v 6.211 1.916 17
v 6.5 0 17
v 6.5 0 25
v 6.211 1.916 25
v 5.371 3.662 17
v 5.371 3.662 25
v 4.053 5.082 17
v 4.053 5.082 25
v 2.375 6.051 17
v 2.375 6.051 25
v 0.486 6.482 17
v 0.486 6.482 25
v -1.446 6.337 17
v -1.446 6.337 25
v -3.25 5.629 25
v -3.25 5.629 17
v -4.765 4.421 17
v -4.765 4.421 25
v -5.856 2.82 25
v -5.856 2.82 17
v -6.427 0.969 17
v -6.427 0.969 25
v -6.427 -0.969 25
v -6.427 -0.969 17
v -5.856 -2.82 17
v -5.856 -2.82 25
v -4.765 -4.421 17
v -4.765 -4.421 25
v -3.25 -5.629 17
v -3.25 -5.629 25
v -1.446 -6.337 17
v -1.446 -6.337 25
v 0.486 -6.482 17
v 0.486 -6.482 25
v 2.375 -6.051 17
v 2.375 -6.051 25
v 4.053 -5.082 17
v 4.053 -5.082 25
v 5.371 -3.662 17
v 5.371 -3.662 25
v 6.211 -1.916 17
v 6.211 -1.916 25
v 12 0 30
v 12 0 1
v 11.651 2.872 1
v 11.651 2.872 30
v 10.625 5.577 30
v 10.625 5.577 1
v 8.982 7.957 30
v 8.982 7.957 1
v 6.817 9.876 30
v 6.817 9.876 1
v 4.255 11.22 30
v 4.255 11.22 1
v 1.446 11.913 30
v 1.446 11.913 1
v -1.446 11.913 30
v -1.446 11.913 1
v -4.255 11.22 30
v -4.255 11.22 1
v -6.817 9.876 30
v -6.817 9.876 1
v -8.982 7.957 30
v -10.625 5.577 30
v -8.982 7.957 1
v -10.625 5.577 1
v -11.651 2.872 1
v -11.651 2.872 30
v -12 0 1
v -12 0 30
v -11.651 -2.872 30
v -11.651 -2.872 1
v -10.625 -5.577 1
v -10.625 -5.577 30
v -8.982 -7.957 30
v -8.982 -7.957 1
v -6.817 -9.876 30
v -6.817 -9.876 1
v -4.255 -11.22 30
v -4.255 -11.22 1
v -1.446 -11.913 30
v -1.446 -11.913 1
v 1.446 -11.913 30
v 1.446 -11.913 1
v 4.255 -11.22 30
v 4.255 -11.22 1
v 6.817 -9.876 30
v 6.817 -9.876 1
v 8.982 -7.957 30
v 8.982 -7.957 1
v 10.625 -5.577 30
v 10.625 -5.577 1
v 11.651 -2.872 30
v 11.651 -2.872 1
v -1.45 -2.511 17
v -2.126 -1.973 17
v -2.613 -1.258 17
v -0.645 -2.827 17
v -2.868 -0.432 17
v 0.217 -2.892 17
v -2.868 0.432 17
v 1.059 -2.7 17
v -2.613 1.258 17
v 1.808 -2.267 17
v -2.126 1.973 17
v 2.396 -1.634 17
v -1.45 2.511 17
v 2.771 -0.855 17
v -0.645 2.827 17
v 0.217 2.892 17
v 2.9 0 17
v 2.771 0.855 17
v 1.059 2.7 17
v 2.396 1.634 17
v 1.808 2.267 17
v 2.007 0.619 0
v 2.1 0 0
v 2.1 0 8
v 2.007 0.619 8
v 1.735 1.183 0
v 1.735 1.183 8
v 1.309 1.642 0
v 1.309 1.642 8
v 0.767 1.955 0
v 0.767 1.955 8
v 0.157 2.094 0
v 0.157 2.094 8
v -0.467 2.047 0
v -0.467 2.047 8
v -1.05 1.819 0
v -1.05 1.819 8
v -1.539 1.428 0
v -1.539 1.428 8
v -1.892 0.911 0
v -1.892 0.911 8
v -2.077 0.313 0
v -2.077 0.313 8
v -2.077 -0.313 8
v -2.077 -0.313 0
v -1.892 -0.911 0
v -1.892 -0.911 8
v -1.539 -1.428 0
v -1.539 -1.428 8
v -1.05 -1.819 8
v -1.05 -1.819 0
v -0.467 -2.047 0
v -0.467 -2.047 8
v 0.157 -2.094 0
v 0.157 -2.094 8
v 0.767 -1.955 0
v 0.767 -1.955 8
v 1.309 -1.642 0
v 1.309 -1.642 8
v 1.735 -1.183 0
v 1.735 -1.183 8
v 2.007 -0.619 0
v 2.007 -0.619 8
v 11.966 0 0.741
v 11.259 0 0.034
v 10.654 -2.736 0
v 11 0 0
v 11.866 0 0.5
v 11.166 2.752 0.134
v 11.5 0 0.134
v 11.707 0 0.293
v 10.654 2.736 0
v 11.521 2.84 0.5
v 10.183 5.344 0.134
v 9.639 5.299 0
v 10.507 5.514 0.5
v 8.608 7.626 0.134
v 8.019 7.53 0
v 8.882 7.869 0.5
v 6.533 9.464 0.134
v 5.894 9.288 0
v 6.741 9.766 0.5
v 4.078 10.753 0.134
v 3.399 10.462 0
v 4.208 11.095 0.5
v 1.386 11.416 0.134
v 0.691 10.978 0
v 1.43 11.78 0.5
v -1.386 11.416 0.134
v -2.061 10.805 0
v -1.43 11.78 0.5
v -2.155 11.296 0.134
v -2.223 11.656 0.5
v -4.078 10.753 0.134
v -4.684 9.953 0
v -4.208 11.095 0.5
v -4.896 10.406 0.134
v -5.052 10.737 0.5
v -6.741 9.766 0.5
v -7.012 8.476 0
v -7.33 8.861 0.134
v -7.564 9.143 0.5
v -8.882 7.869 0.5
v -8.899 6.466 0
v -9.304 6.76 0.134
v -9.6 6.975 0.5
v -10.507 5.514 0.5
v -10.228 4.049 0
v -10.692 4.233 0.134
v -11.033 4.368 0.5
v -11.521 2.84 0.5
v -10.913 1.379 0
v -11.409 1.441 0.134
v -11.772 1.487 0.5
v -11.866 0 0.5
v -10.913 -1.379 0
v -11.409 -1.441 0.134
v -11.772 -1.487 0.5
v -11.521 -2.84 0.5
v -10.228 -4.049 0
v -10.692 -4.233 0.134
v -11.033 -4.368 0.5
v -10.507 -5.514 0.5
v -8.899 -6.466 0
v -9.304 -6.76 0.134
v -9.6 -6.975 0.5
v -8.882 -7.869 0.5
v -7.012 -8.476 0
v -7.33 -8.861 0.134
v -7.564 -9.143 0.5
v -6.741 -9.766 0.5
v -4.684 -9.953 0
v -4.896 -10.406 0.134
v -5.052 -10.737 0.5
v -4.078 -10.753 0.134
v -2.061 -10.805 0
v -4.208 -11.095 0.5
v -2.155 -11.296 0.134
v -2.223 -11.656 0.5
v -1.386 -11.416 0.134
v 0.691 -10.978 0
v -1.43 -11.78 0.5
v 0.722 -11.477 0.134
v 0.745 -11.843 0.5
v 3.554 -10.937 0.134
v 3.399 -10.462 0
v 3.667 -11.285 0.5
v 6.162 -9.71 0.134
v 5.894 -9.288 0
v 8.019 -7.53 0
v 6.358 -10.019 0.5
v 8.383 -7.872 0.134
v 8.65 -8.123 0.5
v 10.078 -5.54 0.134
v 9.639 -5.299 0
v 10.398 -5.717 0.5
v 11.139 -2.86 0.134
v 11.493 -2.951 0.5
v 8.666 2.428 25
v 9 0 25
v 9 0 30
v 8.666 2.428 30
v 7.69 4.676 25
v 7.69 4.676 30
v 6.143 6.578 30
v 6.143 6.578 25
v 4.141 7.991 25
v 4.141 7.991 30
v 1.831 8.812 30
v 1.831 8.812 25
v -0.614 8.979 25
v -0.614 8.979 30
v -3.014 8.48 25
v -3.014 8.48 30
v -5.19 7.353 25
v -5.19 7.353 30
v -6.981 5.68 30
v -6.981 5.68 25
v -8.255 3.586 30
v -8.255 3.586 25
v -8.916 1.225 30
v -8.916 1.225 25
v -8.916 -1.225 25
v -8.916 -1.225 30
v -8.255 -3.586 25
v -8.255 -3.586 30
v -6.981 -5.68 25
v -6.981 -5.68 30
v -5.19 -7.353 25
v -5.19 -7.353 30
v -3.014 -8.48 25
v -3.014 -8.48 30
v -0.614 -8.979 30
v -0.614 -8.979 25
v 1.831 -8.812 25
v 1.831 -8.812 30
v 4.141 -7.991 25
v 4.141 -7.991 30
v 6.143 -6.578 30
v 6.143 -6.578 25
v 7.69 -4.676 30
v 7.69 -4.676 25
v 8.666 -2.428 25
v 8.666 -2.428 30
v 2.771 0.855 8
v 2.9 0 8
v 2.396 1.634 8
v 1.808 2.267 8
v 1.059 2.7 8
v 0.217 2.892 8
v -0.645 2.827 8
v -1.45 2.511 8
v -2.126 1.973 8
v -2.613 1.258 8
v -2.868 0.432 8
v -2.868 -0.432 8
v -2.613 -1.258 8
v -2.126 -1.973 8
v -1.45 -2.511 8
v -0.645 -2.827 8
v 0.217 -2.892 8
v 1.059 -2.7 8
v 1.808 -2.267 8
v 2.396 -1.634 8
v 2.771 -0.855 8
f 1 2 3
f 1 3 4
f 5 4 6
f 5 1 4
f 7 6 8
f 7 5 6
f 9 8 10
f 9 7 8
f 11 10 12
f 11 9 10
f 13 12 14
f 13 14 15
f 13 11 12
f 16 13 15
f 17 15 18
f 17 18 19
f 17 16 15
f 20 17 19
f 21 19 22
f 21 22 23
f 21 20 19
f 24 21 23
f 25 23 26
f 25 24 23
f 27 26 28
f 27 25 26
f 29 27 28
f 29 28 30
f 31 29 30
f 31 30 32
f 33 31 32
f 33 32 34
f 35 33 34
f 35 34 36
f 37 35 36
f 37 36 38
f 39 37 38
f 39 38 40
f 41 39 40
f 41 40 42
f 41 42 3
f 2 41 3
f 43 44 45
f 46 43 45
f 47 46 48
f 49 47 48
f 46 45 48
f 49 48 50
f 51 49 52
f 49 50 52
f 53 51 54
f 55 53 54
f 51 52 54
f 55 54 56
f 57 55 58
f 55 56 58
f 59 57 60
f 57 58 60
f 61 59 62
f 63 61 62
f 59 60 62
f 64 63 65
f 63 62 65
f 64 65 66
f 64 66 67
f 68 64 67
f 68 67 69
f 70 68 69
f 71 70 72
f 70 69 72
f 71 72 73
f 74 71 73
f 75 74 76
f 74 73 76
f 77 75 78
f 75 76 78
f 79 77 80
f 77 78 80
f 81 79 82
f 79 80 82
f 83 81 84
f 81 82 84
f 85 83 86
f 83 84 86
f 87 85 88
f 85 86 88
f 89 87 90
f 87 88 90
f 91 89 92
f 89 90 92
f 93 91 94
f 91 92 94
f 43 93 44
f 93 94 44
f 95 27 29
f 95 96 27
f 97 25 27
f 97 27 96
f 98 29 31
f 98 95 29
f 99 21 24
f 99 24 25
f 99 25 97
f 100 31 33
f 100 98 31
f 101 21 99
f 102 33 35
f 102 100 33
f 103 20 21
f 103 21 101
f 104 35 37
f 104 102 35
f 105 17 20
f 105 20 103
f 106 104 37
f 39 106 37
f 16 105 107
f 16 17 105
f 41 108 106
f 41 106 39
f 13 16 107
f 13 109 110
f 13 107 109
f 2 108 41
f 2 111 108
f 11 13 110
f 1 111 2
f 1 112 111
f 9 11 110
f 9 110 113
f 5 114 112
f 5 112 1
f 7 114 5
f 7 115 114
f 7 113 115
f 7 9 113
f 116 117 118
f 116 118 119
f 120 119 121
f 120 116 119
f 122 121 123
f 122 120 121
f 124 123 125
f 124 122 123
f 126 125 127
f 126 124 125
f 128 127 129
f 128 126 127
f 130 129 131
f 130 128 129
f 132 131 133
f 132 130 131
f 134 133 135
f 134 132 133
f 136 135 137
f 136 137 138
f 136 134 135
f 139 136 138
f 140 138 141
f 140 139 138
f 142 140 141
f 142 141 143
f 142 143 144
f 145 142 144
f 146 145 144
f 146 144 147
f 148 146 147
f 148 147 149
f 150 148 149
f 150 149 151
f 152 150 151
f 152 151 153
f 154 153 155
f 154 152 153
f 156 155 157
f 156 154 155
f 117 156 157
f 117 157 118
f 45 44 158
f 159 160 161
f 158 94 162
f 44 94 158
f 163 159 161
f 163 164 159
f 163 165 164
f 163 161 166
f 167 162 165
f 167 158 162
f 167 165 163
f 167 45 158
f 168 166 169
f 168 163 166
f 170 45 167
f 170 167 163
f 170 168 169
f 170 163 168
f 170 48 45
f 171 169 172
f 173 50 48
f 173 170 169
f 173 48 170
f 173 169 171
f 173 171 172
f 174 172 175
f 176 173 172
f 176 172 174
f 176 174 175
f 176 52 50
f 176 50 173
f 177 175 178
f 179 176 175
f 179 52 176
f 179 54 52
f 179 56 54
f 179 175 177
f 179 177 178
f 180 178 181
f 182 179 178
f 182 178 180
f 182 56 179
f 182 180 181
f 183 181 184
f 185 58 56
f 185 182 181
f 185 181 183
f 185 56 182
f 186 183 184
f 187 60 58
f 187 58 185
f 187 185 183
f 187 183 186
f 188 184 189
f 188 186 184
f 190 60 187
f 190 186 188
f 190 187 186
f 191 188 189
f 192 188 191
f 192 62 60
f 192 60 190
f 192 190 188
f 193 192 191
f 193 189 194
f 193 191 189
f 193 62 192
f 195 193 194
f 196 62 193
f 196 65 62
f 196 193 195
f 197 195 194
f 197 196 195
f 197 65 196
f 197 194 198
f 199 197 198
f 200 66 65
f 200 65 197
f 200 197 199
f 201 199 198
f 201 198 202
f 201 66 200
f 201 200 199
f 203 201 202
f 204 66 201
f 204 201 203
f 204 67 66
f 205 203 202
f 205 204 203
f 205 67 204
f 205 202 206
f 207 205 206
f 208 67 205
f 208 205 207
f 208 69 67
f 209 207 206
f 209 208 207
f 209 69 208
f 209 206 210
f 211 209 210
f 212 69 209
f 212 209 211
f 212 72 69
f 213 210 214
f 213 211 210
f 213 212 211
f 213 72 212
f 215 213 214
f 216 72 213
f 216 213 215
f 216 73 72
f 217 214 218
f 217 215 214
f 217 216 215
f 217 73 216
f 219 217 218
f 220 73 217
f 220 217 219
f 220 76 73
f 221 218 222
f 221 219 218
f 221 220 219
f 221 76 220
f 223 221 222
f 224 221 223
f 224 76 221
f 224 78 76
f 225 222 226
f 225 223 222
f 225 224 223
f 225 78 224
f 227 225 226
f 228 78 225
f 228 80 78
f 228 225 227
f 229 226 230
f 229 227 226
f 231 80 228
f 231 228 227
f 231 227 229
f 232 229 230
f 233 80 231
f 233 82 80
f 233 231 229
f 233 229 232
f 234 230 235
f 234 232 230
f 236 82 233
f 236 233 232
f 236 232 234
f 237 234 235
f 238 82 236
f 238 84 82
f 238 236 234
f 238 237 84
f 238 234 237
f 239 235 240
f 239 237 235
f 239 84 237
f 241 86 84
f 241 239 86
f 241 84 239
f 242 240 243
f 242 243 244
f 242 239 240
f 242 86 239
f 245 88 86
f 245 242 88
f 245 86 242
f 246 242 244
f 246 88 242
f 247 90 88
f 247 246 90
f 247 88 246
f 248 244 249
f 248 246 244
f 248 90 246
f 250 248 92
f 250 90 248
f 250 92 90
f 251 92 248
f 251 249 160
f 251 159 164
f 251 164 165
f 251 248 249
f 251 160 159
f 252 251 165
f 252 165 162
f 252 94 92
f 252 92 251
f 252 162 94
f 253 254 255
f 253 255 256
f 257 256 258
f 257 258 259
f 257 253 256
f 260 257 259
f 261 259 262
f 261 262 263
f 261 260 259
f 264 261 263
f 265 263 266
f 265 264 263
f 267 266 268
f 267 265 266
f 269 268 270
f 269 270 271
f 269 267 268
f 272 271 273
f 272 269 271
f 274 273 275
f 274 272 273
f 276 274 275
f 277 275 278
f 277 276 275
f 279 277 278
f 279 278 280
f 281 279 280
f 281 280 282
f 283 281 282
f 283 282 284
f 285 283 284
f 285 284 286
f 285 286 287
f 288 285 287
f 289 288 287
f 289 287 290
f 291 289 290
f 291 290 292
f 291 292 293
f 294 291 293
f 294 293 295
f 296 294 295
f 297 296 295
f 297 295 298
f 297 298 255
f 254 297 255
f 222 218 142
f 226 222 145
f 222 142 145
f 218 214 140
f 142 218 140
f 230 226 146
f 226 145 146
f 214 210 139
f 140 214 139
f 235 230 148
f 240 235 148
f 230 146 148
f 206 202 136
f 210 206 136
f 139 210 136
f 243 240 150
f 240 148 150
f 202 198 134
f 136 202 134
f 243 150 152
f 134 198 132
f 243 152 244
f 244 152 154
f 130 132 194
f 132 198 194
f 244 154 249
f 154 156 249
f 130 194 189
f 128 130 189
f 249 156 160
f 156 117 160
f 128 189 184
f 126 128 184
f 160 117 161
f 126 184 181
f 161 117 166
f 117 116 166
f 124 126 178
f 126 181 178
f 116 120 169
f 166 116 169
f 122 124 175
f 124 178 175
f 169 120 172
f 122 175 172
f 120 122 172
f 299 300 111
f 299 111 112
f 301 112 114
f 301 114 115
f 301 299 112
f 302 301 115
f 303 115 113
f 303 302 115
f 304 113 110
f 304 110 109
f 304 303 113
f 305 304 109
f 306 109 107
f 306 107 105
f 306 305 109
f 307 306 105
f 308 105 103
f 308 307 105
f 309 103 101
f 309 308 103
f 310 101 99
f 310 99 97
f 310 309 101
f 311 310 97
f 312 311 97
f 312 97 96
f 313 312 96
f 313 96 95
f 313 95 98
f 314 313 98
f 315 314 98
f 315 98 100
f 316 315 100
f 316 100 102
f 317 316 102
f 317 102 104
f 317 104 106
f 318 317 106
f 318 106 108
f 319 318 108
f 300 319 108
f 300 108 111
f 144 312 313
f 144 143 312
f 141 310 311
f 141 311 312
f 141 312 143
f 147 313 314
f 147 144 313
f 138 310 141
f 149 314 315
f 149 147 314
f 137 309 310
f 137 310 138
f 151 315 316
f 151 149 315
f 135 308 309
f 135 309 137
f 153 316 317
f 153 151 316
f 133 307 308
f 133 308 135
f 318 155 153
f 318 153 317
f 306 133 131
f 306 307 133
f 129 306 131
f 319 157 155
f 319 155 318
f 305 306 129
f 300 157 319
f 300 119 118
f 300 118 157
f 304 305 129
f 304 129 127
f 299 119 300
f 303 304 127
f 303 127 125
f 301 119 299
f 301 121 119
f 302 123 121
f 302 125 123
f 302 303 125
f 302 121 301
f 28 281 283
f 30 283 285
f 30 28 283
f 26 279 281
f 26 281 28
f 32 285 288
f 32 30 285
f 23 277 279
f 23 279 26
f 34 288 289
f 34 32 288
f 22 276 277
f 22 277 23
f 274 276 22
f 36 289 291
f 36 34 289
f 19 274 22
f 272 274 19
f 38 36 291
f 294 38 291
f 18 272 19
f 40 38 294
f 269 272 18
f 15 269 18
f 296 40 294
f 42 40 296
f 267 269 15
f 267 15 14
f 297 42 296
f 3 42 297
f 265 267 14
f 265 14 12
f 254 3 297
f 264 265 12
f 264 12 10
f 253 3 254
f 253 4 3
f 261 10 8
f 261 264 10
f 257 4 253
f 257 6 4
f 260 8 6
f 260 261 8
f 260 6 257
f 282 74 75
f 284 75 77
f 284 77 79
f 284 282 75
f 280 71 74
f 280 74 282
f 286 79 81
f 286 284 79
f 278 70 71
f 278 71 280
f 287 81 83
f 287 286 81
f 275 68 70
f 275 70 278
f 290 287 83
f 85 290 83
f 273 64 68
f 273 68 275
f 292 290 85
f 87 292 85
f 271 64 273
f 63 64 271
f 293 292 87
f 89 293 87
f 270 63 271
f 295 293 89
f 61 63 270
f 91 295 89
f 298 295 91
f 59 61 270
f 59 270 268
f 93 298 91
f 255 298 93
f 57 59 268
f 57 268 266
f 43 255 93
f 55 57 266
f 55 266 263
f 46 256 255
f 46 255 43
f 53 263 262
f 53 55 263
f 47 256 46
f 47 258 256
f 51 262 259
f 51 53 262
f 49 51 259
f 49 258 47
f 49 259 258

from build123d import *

# Parameters (mm, degrees)
F0_R     = 12
F0_R_2   = 9
F1_DEPTH = 30
F0_R_3   = 6.5
F2_DEPTH = 25
F0_R_4   = 2.9
F3_DEPTH = 17
F0_R_5   = 2.1
F4_DEPTH = 8
F5_R     = 1


with BuildPart() as f1:
    # F0 (on Top) → F1 (new body)
    with BuildSketch(Plane.XY):
        Circle(F0_R)
        Circle(F0_R_2, mode=Mode.SUBTRACT)
    extrude(amount=F1_DEPTH)

    # F0 (on Top) → F2 (join)
    with BuildSketch(Plane.XY):
        Circle(F0_R_2)
        Circle(F0_R_3, mode=Mode.SUBTRACT)
    extrude(amount=F2_DEPTH)

    # F0 (on Top) → F3 (join)
    with BuildSketch(Plane.XY):
        Circle(F0_R_3)
        Circle(F0_R_4, mode=Mode.SUBTRACT)
    extrude(amount=F3_DEPTH)

    # F0 (on Top) → F4 (join)
    with BuildSketch(Plane.XY):
        Circle(F0_R_4)
        Circle(F0_R_5, mode=Mode.SUBTRACT)
    extrude(amount=F4_DEPTH)

    # F5
    f5_edges = [f1.edges().sort_by_distance(p)[0] for p in [
        (-12, 0, 0),
    ]]
    fillet(f5_edges, radius=F5_R)


solid = f1.part
